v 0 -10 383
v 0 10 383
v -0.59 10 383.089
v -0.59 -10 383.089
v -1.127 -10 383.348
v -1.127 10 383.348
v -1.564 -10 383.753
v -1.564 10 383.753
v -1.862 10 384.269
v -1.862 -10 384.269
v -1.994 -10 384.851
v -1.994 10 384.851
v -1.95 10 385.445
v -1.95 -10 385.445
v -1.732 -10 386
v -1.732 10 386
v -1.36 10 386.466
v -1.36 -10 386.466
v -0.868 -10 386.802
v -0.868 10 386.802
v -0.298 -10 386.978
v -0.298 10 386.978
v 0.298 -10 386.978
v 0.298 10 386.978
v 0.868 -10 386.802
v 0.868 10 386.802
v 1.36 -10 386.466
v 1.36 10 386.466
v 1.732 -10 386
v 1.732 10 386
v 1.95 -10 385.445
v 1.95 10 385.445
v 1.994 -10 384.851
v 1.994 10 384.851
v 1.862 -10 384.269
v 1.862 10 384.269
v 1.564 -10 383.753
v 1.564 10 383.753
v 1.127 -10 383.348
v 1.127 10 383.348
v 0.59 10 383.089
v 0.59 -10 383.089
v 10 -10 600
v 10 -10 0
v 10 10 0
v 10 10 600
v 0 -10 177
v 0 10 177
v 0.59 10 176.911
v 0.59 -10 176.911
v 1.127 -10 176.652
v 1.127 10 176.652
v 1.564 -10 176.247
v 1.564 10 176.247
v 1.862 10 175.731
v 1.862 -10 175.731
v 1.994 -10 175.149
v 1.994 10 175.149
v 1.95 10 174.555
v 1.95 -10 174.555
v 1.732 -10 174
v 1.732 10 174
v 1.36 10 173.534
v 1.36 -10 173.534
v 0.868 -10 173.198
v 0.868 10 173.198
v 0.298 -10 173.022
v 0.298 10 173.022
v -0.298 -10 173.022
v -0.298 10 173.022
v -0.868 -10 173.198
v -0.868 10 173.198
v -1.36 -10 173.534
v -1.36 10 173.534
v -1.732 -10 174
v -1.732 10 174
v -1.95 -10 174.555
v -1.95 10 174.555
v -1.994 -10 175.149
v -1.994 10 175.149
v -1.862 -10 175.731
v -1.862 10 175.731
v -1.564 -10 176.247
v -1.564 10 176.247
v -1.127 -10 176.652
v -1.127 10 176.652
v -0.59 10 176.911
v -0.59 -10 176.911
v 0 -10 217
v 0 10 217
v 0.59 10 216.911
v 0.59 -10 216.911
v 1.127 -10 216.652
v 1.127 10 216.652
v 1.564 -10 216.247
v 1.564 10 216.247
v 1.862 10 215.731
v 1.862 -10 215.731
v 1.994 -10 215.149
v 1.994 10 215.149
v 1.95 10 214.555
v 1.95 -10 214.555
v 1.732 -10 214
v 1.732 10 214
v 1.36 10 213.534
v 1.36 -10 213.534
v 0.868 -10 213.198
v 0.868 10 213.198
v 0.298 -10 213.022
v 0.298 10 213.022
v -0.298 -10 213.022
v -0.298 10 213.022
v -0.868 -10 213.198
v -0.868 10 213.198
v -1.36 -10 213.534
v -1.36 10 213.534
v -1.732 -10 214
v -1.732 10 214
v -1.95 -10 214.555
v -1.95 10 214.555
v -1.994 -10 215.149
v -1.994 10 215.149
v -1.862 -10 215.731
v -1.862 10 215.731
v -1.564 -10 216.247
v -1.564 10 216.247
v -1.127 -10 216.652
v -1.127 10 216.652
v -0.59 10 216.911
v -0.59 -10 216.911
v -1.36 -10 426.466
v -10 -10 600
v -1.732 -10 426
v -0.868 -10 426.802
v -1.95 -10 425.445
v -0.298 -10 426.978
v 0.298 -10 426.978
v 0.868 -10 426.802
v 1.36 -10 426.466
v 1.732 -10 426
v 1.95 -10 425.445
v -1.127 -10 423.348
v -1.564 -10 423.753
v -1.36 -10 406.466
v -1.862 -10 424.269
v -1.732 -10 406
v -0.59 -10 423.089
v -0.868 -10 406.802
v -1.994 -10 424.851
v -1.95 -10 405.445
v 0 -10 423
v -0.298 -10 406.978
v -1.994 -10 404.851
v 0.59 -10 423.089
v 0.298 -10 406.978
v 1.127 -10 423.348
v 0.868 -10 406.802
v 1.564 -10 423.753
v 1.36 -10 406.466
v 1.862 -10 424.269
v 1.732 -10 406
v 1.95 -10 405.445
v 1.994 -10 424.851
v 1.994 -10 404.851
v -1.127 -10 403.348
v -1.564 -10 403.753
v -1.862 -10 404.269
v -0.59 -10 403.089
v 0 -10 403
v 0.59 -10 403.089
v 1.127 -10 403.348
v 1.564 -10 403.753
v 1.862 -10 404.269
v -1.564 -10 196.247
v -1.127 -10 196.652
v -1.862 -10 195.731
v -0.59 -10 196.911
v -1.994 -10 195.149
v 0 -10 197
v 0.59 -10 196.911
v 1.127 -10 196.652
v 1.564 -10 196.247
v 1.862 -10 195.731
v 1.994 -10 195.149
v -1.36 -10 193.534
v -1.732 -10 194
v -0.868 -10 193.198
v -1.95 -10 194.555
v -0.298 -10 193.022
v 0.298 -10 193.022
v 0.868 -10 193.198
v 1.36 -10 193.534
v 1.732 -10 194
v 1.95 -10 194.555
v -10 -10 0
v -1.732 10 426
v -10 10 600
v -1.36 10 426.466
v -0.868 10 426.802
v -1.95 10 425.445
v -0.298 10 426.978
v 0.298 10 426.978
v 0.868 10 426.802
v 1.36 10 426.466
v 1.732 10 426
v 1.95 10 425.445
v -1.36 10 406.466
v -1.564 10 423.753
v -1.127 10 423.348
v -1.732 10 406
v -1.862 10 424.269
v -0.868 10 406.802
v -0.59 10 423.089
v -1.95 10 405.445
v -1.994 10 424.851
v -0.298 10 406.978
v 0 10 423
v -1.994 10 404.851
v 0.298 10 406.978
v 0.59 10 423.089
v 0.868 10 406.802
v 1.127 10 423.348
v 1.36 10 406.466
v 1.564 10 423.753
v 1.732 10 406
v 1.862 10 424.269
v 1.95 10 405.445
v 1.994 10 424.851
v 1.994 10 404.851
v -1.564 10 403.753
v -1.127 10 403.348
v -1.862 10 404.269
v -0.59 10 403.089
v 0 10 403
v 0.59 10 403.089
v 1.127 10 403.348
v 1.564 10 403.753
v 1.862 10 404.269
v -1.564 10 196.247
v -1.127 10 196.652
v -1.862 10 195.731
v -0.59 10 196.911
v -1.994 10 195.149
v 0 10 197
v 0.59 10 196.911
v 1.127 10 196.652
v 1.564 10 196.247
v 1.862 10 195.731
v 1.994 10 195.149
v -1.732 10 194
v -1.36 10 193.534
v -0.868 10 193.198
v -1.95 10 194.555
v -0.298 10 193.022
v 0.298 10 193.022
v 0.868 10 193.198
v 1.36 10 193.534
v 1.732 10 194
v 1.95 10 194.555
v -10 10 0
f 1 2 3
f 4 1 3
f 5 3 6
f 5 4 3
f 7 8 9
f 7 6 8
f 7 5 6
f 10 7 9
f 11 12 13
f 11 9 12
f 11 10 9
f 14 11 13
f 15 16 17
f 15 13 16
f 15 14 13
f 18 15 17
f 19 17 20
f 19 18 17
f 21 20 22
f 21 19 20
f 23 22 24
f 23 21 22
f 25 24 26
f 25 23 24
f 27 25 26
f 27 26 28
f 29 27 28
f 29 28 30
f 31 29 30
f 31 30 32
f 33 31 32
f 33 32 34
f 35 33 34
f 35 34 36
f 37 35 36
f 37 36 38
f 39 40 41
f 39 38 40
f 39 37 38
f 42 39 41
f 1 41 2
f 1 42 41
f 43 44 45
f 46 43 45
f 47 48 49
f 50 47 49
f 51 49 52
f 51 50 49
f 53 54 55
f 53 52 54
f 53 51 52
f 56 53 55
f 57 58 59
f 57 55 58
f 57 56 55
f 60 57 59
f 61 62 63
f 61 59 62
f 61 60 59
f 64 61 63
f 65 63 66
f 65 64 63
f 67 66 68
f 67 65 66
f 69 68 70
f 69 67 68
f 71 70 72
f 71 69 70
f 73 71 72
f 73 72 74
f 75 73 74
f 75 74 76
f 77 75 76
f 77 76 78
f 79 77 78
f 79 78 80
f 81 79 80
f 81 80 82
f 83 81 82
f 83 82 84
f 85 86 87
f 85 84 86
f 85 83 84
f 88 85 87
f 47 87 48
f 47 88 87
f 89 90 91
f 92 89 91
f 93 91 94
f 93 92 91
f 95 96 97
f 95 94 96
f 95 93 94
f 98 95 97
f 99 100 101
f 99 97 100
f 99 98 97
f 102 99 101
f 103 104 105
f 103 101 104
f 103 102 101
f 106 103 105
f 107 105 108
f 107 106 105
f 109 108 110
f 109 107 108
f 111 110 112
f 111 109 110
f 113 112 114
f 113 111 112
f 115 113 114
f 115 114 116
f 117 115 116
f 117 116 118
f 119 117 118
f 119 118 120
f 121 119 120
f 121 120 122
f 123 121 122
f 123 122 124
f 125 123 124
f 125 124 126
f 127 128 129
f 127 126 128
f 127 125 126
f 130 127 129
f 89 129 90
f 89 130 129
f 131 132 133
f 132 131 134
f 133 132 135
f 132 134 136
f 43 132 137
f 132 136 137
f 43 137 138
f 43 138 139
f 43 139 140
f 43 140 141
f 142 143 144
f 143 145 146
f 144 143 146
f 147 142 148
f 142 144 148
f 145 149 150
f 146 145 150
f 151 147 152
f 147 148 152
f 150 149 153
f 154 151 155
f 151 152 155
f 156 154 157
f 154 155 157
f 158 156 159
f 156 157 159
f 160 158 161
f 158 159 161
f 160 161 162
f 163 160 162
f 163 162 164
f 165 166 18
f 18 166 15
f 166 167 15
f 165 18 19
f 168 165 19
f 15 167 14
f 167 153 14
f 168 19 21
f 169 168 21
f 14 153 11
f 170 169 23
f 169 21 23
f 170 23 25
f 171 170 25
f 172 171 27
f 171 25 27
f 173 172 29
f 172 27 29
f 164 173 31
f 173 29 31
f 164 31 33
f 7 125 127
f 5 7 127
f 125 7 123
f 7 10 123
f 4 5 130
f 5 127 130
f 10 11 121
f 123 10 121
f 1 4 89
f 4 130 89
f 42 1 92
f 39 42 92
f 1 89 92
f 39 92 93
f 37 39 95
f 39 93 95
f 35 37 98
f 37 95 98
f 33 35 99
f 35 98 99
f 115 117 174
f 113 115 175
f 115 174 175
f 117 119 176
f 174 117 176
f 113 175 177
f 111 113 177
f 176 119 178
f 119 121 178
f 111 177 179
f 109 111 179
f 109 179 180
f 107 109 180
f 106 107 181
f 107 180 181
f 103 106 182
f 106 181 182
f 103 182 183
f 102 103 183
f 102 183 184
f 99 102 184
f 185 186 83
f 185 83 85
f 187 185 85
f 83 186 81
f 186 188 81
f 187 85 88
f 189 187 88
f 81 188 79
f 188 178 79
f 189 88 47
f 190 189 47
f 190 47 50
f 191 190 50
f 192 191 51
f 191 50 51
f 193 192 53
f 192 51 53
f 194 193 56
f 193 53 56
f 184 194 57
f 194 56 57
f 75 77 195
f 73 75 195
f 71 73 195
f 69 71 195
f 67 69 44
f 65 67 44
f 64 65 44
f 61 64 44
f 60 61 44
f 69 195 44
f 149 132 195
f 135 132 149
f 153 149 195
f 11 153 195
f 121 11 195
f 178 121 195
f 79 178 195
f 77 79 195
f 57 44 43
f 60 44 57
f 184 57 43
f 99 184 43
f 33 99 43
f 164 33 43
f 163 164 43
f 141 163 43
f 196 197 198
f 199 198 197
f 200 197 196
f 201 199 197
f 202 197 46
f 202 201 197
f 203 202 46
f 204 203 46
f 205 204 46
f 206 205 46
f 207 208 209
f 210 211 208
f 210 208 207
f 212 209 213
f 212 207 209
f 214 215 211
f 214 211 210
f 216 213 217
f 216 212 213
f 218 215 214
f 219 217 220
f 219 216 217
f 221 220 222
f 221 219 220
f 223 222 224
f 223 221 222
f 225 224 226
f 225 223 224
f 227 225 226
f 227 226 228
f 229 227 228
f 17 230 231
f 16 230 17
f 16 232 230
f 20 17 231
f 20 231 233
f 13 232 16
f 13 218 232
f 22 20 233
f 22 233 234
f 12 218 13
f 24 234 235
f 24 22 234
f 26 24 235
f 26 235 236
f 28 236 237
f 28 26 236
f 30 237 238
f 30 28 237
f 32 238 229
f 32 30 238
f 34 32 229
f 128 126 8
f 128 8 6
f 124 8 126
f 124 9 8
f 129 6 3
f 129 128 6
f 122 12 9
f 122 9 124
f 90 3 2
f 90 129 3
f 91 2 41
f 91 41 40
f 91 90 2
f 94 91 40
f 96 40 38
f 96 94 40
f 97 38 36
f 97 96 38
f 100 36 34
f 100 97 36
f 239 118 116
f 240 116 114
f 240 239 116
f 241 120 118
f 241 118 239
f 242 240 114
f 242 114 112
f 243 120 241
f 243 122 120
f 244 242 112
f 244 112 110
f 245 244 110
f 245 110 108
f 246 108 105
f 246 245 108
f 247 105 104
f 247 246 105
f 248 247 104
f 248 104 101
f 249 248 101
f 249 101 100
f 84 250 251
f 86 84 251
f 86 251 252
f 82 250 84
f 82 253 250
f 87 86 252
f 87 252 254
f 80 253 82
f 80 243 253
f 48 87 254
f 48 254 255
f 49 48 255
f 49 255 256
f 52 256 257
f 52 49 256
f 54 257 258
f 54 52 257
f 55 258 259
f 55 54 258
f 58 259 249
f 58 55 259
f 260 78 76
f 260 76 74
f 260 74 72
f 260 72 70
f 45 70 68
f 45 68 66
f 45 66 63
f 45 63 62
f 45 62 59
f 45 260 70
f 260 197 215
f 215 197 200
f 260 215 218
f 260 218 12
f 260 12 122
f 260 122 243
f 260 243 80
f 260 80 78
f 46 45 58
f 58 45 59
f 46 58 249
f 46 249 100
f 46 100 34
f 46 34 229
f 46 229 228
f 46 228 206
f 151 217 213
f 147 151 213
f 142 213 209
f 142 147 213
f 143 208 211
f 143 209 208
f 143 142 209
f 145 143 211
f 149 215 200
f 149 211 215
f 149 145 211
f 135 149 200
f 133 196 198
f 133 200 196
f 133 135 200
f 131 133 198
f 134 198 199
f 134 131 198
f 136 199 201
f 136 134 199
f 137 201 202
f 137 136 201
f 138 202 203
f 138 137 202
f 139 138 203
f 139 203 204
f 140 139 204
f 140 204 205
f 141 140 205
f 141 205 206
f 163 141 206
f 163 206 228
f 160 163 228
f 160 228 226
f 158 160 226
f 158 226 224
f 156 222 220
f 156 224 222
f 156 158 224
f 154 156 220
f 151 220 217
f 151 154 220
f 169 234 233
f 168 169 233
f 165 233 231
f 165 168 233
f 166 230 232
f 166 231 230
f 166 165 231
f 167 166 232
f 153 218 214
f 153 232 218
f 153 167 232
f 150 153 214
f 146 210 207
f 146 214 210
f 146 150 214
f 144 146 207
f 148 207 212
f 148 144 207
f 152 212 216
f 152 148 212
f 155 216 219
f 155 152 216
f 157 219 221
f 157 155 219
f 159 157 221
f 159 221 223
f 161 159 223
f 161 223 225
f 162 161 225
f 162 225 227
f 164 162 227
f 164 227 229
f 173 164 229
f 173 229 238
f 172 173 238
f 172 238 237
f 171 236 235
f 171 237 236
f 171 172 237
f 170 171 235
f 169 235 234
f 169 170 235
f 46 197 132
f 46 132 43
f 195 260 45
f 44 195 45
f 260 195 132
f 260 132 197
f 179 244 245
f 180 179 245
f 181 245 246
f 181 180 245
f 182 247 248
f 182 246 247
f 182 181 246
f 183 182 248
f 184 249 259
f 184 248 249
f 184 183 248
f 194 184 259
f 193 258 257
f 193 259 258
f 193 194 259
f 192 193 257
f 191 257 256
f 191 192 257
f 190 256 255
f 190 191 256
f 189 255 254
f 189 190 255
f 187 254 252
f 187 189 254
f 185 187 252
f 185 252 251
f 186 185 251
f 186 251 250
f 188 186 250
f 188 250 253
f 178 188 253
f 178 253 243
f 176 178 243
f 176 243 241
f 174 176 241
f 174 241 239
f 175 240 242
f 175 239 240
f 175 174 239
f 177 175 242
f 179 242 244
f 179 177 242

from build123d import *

# Parameters (mm, degrees)
SKETCH_1_W               = 20
SKETCH_1_H               = 20
EXTRUDE_1_DEPTH          = 600
CUT_EXTRUDE_1_DEPTH      = 601.416522091
CUT_EXTRUDE_1_DEPTH_BACK = 601.416522091
SKETCH_2_R               = 2


with BuildPart() as part:
    # 草图1 → 凸台-拉伸1 (new body)
    with BuildSketch(Plane.XY):
        Rectangle(SKETCH_1_W, SKETCH_1_H)
    extrude(amount=EXTRUDE_1_DEPTH)

    # 草图2 → 切除-拉伸1 (cut, two sides: drawn at the far end of the back side and taken through both)
    with BuildSketch(Plane(origin=(0, 10, 0), x_dir=(1, 0, 0), z_dir=(0, 1, 0)).offset(-CUT_EXTRUDE_1_DEPTH_BACK)):
        with Locations(Location((0, -195, 0), (0, 0, 270))):
            Circle(SKETCH_2_R)
        with Locations(Location((0, -175, 0), (0, 0, 270))):
            Circle(SKETCH_2_R)
        with Locations(Location((0, -215, 0), (0, 0, 270))):
            Circle(SKETCH_2_R)
        with Locations(Location((0, -385, 0), (0, 0, 90))):
            Circle(SKETCH_2_R)
        with Locations(Location((0, -405, 0), (0, 0, 90))):
            Circle(SKETCH_2_R)
        with Locations(Location((0, -425, 0), (0, 0, 90))):
            Circle(SKETCH_2_R)
    extrude(amount=CUT_EXTRUDE_1_DEPTH + CUT_EXTRUDE_1_DEPTH_BACK, mode=Mode.SUBTRACT)


solid = part.part
